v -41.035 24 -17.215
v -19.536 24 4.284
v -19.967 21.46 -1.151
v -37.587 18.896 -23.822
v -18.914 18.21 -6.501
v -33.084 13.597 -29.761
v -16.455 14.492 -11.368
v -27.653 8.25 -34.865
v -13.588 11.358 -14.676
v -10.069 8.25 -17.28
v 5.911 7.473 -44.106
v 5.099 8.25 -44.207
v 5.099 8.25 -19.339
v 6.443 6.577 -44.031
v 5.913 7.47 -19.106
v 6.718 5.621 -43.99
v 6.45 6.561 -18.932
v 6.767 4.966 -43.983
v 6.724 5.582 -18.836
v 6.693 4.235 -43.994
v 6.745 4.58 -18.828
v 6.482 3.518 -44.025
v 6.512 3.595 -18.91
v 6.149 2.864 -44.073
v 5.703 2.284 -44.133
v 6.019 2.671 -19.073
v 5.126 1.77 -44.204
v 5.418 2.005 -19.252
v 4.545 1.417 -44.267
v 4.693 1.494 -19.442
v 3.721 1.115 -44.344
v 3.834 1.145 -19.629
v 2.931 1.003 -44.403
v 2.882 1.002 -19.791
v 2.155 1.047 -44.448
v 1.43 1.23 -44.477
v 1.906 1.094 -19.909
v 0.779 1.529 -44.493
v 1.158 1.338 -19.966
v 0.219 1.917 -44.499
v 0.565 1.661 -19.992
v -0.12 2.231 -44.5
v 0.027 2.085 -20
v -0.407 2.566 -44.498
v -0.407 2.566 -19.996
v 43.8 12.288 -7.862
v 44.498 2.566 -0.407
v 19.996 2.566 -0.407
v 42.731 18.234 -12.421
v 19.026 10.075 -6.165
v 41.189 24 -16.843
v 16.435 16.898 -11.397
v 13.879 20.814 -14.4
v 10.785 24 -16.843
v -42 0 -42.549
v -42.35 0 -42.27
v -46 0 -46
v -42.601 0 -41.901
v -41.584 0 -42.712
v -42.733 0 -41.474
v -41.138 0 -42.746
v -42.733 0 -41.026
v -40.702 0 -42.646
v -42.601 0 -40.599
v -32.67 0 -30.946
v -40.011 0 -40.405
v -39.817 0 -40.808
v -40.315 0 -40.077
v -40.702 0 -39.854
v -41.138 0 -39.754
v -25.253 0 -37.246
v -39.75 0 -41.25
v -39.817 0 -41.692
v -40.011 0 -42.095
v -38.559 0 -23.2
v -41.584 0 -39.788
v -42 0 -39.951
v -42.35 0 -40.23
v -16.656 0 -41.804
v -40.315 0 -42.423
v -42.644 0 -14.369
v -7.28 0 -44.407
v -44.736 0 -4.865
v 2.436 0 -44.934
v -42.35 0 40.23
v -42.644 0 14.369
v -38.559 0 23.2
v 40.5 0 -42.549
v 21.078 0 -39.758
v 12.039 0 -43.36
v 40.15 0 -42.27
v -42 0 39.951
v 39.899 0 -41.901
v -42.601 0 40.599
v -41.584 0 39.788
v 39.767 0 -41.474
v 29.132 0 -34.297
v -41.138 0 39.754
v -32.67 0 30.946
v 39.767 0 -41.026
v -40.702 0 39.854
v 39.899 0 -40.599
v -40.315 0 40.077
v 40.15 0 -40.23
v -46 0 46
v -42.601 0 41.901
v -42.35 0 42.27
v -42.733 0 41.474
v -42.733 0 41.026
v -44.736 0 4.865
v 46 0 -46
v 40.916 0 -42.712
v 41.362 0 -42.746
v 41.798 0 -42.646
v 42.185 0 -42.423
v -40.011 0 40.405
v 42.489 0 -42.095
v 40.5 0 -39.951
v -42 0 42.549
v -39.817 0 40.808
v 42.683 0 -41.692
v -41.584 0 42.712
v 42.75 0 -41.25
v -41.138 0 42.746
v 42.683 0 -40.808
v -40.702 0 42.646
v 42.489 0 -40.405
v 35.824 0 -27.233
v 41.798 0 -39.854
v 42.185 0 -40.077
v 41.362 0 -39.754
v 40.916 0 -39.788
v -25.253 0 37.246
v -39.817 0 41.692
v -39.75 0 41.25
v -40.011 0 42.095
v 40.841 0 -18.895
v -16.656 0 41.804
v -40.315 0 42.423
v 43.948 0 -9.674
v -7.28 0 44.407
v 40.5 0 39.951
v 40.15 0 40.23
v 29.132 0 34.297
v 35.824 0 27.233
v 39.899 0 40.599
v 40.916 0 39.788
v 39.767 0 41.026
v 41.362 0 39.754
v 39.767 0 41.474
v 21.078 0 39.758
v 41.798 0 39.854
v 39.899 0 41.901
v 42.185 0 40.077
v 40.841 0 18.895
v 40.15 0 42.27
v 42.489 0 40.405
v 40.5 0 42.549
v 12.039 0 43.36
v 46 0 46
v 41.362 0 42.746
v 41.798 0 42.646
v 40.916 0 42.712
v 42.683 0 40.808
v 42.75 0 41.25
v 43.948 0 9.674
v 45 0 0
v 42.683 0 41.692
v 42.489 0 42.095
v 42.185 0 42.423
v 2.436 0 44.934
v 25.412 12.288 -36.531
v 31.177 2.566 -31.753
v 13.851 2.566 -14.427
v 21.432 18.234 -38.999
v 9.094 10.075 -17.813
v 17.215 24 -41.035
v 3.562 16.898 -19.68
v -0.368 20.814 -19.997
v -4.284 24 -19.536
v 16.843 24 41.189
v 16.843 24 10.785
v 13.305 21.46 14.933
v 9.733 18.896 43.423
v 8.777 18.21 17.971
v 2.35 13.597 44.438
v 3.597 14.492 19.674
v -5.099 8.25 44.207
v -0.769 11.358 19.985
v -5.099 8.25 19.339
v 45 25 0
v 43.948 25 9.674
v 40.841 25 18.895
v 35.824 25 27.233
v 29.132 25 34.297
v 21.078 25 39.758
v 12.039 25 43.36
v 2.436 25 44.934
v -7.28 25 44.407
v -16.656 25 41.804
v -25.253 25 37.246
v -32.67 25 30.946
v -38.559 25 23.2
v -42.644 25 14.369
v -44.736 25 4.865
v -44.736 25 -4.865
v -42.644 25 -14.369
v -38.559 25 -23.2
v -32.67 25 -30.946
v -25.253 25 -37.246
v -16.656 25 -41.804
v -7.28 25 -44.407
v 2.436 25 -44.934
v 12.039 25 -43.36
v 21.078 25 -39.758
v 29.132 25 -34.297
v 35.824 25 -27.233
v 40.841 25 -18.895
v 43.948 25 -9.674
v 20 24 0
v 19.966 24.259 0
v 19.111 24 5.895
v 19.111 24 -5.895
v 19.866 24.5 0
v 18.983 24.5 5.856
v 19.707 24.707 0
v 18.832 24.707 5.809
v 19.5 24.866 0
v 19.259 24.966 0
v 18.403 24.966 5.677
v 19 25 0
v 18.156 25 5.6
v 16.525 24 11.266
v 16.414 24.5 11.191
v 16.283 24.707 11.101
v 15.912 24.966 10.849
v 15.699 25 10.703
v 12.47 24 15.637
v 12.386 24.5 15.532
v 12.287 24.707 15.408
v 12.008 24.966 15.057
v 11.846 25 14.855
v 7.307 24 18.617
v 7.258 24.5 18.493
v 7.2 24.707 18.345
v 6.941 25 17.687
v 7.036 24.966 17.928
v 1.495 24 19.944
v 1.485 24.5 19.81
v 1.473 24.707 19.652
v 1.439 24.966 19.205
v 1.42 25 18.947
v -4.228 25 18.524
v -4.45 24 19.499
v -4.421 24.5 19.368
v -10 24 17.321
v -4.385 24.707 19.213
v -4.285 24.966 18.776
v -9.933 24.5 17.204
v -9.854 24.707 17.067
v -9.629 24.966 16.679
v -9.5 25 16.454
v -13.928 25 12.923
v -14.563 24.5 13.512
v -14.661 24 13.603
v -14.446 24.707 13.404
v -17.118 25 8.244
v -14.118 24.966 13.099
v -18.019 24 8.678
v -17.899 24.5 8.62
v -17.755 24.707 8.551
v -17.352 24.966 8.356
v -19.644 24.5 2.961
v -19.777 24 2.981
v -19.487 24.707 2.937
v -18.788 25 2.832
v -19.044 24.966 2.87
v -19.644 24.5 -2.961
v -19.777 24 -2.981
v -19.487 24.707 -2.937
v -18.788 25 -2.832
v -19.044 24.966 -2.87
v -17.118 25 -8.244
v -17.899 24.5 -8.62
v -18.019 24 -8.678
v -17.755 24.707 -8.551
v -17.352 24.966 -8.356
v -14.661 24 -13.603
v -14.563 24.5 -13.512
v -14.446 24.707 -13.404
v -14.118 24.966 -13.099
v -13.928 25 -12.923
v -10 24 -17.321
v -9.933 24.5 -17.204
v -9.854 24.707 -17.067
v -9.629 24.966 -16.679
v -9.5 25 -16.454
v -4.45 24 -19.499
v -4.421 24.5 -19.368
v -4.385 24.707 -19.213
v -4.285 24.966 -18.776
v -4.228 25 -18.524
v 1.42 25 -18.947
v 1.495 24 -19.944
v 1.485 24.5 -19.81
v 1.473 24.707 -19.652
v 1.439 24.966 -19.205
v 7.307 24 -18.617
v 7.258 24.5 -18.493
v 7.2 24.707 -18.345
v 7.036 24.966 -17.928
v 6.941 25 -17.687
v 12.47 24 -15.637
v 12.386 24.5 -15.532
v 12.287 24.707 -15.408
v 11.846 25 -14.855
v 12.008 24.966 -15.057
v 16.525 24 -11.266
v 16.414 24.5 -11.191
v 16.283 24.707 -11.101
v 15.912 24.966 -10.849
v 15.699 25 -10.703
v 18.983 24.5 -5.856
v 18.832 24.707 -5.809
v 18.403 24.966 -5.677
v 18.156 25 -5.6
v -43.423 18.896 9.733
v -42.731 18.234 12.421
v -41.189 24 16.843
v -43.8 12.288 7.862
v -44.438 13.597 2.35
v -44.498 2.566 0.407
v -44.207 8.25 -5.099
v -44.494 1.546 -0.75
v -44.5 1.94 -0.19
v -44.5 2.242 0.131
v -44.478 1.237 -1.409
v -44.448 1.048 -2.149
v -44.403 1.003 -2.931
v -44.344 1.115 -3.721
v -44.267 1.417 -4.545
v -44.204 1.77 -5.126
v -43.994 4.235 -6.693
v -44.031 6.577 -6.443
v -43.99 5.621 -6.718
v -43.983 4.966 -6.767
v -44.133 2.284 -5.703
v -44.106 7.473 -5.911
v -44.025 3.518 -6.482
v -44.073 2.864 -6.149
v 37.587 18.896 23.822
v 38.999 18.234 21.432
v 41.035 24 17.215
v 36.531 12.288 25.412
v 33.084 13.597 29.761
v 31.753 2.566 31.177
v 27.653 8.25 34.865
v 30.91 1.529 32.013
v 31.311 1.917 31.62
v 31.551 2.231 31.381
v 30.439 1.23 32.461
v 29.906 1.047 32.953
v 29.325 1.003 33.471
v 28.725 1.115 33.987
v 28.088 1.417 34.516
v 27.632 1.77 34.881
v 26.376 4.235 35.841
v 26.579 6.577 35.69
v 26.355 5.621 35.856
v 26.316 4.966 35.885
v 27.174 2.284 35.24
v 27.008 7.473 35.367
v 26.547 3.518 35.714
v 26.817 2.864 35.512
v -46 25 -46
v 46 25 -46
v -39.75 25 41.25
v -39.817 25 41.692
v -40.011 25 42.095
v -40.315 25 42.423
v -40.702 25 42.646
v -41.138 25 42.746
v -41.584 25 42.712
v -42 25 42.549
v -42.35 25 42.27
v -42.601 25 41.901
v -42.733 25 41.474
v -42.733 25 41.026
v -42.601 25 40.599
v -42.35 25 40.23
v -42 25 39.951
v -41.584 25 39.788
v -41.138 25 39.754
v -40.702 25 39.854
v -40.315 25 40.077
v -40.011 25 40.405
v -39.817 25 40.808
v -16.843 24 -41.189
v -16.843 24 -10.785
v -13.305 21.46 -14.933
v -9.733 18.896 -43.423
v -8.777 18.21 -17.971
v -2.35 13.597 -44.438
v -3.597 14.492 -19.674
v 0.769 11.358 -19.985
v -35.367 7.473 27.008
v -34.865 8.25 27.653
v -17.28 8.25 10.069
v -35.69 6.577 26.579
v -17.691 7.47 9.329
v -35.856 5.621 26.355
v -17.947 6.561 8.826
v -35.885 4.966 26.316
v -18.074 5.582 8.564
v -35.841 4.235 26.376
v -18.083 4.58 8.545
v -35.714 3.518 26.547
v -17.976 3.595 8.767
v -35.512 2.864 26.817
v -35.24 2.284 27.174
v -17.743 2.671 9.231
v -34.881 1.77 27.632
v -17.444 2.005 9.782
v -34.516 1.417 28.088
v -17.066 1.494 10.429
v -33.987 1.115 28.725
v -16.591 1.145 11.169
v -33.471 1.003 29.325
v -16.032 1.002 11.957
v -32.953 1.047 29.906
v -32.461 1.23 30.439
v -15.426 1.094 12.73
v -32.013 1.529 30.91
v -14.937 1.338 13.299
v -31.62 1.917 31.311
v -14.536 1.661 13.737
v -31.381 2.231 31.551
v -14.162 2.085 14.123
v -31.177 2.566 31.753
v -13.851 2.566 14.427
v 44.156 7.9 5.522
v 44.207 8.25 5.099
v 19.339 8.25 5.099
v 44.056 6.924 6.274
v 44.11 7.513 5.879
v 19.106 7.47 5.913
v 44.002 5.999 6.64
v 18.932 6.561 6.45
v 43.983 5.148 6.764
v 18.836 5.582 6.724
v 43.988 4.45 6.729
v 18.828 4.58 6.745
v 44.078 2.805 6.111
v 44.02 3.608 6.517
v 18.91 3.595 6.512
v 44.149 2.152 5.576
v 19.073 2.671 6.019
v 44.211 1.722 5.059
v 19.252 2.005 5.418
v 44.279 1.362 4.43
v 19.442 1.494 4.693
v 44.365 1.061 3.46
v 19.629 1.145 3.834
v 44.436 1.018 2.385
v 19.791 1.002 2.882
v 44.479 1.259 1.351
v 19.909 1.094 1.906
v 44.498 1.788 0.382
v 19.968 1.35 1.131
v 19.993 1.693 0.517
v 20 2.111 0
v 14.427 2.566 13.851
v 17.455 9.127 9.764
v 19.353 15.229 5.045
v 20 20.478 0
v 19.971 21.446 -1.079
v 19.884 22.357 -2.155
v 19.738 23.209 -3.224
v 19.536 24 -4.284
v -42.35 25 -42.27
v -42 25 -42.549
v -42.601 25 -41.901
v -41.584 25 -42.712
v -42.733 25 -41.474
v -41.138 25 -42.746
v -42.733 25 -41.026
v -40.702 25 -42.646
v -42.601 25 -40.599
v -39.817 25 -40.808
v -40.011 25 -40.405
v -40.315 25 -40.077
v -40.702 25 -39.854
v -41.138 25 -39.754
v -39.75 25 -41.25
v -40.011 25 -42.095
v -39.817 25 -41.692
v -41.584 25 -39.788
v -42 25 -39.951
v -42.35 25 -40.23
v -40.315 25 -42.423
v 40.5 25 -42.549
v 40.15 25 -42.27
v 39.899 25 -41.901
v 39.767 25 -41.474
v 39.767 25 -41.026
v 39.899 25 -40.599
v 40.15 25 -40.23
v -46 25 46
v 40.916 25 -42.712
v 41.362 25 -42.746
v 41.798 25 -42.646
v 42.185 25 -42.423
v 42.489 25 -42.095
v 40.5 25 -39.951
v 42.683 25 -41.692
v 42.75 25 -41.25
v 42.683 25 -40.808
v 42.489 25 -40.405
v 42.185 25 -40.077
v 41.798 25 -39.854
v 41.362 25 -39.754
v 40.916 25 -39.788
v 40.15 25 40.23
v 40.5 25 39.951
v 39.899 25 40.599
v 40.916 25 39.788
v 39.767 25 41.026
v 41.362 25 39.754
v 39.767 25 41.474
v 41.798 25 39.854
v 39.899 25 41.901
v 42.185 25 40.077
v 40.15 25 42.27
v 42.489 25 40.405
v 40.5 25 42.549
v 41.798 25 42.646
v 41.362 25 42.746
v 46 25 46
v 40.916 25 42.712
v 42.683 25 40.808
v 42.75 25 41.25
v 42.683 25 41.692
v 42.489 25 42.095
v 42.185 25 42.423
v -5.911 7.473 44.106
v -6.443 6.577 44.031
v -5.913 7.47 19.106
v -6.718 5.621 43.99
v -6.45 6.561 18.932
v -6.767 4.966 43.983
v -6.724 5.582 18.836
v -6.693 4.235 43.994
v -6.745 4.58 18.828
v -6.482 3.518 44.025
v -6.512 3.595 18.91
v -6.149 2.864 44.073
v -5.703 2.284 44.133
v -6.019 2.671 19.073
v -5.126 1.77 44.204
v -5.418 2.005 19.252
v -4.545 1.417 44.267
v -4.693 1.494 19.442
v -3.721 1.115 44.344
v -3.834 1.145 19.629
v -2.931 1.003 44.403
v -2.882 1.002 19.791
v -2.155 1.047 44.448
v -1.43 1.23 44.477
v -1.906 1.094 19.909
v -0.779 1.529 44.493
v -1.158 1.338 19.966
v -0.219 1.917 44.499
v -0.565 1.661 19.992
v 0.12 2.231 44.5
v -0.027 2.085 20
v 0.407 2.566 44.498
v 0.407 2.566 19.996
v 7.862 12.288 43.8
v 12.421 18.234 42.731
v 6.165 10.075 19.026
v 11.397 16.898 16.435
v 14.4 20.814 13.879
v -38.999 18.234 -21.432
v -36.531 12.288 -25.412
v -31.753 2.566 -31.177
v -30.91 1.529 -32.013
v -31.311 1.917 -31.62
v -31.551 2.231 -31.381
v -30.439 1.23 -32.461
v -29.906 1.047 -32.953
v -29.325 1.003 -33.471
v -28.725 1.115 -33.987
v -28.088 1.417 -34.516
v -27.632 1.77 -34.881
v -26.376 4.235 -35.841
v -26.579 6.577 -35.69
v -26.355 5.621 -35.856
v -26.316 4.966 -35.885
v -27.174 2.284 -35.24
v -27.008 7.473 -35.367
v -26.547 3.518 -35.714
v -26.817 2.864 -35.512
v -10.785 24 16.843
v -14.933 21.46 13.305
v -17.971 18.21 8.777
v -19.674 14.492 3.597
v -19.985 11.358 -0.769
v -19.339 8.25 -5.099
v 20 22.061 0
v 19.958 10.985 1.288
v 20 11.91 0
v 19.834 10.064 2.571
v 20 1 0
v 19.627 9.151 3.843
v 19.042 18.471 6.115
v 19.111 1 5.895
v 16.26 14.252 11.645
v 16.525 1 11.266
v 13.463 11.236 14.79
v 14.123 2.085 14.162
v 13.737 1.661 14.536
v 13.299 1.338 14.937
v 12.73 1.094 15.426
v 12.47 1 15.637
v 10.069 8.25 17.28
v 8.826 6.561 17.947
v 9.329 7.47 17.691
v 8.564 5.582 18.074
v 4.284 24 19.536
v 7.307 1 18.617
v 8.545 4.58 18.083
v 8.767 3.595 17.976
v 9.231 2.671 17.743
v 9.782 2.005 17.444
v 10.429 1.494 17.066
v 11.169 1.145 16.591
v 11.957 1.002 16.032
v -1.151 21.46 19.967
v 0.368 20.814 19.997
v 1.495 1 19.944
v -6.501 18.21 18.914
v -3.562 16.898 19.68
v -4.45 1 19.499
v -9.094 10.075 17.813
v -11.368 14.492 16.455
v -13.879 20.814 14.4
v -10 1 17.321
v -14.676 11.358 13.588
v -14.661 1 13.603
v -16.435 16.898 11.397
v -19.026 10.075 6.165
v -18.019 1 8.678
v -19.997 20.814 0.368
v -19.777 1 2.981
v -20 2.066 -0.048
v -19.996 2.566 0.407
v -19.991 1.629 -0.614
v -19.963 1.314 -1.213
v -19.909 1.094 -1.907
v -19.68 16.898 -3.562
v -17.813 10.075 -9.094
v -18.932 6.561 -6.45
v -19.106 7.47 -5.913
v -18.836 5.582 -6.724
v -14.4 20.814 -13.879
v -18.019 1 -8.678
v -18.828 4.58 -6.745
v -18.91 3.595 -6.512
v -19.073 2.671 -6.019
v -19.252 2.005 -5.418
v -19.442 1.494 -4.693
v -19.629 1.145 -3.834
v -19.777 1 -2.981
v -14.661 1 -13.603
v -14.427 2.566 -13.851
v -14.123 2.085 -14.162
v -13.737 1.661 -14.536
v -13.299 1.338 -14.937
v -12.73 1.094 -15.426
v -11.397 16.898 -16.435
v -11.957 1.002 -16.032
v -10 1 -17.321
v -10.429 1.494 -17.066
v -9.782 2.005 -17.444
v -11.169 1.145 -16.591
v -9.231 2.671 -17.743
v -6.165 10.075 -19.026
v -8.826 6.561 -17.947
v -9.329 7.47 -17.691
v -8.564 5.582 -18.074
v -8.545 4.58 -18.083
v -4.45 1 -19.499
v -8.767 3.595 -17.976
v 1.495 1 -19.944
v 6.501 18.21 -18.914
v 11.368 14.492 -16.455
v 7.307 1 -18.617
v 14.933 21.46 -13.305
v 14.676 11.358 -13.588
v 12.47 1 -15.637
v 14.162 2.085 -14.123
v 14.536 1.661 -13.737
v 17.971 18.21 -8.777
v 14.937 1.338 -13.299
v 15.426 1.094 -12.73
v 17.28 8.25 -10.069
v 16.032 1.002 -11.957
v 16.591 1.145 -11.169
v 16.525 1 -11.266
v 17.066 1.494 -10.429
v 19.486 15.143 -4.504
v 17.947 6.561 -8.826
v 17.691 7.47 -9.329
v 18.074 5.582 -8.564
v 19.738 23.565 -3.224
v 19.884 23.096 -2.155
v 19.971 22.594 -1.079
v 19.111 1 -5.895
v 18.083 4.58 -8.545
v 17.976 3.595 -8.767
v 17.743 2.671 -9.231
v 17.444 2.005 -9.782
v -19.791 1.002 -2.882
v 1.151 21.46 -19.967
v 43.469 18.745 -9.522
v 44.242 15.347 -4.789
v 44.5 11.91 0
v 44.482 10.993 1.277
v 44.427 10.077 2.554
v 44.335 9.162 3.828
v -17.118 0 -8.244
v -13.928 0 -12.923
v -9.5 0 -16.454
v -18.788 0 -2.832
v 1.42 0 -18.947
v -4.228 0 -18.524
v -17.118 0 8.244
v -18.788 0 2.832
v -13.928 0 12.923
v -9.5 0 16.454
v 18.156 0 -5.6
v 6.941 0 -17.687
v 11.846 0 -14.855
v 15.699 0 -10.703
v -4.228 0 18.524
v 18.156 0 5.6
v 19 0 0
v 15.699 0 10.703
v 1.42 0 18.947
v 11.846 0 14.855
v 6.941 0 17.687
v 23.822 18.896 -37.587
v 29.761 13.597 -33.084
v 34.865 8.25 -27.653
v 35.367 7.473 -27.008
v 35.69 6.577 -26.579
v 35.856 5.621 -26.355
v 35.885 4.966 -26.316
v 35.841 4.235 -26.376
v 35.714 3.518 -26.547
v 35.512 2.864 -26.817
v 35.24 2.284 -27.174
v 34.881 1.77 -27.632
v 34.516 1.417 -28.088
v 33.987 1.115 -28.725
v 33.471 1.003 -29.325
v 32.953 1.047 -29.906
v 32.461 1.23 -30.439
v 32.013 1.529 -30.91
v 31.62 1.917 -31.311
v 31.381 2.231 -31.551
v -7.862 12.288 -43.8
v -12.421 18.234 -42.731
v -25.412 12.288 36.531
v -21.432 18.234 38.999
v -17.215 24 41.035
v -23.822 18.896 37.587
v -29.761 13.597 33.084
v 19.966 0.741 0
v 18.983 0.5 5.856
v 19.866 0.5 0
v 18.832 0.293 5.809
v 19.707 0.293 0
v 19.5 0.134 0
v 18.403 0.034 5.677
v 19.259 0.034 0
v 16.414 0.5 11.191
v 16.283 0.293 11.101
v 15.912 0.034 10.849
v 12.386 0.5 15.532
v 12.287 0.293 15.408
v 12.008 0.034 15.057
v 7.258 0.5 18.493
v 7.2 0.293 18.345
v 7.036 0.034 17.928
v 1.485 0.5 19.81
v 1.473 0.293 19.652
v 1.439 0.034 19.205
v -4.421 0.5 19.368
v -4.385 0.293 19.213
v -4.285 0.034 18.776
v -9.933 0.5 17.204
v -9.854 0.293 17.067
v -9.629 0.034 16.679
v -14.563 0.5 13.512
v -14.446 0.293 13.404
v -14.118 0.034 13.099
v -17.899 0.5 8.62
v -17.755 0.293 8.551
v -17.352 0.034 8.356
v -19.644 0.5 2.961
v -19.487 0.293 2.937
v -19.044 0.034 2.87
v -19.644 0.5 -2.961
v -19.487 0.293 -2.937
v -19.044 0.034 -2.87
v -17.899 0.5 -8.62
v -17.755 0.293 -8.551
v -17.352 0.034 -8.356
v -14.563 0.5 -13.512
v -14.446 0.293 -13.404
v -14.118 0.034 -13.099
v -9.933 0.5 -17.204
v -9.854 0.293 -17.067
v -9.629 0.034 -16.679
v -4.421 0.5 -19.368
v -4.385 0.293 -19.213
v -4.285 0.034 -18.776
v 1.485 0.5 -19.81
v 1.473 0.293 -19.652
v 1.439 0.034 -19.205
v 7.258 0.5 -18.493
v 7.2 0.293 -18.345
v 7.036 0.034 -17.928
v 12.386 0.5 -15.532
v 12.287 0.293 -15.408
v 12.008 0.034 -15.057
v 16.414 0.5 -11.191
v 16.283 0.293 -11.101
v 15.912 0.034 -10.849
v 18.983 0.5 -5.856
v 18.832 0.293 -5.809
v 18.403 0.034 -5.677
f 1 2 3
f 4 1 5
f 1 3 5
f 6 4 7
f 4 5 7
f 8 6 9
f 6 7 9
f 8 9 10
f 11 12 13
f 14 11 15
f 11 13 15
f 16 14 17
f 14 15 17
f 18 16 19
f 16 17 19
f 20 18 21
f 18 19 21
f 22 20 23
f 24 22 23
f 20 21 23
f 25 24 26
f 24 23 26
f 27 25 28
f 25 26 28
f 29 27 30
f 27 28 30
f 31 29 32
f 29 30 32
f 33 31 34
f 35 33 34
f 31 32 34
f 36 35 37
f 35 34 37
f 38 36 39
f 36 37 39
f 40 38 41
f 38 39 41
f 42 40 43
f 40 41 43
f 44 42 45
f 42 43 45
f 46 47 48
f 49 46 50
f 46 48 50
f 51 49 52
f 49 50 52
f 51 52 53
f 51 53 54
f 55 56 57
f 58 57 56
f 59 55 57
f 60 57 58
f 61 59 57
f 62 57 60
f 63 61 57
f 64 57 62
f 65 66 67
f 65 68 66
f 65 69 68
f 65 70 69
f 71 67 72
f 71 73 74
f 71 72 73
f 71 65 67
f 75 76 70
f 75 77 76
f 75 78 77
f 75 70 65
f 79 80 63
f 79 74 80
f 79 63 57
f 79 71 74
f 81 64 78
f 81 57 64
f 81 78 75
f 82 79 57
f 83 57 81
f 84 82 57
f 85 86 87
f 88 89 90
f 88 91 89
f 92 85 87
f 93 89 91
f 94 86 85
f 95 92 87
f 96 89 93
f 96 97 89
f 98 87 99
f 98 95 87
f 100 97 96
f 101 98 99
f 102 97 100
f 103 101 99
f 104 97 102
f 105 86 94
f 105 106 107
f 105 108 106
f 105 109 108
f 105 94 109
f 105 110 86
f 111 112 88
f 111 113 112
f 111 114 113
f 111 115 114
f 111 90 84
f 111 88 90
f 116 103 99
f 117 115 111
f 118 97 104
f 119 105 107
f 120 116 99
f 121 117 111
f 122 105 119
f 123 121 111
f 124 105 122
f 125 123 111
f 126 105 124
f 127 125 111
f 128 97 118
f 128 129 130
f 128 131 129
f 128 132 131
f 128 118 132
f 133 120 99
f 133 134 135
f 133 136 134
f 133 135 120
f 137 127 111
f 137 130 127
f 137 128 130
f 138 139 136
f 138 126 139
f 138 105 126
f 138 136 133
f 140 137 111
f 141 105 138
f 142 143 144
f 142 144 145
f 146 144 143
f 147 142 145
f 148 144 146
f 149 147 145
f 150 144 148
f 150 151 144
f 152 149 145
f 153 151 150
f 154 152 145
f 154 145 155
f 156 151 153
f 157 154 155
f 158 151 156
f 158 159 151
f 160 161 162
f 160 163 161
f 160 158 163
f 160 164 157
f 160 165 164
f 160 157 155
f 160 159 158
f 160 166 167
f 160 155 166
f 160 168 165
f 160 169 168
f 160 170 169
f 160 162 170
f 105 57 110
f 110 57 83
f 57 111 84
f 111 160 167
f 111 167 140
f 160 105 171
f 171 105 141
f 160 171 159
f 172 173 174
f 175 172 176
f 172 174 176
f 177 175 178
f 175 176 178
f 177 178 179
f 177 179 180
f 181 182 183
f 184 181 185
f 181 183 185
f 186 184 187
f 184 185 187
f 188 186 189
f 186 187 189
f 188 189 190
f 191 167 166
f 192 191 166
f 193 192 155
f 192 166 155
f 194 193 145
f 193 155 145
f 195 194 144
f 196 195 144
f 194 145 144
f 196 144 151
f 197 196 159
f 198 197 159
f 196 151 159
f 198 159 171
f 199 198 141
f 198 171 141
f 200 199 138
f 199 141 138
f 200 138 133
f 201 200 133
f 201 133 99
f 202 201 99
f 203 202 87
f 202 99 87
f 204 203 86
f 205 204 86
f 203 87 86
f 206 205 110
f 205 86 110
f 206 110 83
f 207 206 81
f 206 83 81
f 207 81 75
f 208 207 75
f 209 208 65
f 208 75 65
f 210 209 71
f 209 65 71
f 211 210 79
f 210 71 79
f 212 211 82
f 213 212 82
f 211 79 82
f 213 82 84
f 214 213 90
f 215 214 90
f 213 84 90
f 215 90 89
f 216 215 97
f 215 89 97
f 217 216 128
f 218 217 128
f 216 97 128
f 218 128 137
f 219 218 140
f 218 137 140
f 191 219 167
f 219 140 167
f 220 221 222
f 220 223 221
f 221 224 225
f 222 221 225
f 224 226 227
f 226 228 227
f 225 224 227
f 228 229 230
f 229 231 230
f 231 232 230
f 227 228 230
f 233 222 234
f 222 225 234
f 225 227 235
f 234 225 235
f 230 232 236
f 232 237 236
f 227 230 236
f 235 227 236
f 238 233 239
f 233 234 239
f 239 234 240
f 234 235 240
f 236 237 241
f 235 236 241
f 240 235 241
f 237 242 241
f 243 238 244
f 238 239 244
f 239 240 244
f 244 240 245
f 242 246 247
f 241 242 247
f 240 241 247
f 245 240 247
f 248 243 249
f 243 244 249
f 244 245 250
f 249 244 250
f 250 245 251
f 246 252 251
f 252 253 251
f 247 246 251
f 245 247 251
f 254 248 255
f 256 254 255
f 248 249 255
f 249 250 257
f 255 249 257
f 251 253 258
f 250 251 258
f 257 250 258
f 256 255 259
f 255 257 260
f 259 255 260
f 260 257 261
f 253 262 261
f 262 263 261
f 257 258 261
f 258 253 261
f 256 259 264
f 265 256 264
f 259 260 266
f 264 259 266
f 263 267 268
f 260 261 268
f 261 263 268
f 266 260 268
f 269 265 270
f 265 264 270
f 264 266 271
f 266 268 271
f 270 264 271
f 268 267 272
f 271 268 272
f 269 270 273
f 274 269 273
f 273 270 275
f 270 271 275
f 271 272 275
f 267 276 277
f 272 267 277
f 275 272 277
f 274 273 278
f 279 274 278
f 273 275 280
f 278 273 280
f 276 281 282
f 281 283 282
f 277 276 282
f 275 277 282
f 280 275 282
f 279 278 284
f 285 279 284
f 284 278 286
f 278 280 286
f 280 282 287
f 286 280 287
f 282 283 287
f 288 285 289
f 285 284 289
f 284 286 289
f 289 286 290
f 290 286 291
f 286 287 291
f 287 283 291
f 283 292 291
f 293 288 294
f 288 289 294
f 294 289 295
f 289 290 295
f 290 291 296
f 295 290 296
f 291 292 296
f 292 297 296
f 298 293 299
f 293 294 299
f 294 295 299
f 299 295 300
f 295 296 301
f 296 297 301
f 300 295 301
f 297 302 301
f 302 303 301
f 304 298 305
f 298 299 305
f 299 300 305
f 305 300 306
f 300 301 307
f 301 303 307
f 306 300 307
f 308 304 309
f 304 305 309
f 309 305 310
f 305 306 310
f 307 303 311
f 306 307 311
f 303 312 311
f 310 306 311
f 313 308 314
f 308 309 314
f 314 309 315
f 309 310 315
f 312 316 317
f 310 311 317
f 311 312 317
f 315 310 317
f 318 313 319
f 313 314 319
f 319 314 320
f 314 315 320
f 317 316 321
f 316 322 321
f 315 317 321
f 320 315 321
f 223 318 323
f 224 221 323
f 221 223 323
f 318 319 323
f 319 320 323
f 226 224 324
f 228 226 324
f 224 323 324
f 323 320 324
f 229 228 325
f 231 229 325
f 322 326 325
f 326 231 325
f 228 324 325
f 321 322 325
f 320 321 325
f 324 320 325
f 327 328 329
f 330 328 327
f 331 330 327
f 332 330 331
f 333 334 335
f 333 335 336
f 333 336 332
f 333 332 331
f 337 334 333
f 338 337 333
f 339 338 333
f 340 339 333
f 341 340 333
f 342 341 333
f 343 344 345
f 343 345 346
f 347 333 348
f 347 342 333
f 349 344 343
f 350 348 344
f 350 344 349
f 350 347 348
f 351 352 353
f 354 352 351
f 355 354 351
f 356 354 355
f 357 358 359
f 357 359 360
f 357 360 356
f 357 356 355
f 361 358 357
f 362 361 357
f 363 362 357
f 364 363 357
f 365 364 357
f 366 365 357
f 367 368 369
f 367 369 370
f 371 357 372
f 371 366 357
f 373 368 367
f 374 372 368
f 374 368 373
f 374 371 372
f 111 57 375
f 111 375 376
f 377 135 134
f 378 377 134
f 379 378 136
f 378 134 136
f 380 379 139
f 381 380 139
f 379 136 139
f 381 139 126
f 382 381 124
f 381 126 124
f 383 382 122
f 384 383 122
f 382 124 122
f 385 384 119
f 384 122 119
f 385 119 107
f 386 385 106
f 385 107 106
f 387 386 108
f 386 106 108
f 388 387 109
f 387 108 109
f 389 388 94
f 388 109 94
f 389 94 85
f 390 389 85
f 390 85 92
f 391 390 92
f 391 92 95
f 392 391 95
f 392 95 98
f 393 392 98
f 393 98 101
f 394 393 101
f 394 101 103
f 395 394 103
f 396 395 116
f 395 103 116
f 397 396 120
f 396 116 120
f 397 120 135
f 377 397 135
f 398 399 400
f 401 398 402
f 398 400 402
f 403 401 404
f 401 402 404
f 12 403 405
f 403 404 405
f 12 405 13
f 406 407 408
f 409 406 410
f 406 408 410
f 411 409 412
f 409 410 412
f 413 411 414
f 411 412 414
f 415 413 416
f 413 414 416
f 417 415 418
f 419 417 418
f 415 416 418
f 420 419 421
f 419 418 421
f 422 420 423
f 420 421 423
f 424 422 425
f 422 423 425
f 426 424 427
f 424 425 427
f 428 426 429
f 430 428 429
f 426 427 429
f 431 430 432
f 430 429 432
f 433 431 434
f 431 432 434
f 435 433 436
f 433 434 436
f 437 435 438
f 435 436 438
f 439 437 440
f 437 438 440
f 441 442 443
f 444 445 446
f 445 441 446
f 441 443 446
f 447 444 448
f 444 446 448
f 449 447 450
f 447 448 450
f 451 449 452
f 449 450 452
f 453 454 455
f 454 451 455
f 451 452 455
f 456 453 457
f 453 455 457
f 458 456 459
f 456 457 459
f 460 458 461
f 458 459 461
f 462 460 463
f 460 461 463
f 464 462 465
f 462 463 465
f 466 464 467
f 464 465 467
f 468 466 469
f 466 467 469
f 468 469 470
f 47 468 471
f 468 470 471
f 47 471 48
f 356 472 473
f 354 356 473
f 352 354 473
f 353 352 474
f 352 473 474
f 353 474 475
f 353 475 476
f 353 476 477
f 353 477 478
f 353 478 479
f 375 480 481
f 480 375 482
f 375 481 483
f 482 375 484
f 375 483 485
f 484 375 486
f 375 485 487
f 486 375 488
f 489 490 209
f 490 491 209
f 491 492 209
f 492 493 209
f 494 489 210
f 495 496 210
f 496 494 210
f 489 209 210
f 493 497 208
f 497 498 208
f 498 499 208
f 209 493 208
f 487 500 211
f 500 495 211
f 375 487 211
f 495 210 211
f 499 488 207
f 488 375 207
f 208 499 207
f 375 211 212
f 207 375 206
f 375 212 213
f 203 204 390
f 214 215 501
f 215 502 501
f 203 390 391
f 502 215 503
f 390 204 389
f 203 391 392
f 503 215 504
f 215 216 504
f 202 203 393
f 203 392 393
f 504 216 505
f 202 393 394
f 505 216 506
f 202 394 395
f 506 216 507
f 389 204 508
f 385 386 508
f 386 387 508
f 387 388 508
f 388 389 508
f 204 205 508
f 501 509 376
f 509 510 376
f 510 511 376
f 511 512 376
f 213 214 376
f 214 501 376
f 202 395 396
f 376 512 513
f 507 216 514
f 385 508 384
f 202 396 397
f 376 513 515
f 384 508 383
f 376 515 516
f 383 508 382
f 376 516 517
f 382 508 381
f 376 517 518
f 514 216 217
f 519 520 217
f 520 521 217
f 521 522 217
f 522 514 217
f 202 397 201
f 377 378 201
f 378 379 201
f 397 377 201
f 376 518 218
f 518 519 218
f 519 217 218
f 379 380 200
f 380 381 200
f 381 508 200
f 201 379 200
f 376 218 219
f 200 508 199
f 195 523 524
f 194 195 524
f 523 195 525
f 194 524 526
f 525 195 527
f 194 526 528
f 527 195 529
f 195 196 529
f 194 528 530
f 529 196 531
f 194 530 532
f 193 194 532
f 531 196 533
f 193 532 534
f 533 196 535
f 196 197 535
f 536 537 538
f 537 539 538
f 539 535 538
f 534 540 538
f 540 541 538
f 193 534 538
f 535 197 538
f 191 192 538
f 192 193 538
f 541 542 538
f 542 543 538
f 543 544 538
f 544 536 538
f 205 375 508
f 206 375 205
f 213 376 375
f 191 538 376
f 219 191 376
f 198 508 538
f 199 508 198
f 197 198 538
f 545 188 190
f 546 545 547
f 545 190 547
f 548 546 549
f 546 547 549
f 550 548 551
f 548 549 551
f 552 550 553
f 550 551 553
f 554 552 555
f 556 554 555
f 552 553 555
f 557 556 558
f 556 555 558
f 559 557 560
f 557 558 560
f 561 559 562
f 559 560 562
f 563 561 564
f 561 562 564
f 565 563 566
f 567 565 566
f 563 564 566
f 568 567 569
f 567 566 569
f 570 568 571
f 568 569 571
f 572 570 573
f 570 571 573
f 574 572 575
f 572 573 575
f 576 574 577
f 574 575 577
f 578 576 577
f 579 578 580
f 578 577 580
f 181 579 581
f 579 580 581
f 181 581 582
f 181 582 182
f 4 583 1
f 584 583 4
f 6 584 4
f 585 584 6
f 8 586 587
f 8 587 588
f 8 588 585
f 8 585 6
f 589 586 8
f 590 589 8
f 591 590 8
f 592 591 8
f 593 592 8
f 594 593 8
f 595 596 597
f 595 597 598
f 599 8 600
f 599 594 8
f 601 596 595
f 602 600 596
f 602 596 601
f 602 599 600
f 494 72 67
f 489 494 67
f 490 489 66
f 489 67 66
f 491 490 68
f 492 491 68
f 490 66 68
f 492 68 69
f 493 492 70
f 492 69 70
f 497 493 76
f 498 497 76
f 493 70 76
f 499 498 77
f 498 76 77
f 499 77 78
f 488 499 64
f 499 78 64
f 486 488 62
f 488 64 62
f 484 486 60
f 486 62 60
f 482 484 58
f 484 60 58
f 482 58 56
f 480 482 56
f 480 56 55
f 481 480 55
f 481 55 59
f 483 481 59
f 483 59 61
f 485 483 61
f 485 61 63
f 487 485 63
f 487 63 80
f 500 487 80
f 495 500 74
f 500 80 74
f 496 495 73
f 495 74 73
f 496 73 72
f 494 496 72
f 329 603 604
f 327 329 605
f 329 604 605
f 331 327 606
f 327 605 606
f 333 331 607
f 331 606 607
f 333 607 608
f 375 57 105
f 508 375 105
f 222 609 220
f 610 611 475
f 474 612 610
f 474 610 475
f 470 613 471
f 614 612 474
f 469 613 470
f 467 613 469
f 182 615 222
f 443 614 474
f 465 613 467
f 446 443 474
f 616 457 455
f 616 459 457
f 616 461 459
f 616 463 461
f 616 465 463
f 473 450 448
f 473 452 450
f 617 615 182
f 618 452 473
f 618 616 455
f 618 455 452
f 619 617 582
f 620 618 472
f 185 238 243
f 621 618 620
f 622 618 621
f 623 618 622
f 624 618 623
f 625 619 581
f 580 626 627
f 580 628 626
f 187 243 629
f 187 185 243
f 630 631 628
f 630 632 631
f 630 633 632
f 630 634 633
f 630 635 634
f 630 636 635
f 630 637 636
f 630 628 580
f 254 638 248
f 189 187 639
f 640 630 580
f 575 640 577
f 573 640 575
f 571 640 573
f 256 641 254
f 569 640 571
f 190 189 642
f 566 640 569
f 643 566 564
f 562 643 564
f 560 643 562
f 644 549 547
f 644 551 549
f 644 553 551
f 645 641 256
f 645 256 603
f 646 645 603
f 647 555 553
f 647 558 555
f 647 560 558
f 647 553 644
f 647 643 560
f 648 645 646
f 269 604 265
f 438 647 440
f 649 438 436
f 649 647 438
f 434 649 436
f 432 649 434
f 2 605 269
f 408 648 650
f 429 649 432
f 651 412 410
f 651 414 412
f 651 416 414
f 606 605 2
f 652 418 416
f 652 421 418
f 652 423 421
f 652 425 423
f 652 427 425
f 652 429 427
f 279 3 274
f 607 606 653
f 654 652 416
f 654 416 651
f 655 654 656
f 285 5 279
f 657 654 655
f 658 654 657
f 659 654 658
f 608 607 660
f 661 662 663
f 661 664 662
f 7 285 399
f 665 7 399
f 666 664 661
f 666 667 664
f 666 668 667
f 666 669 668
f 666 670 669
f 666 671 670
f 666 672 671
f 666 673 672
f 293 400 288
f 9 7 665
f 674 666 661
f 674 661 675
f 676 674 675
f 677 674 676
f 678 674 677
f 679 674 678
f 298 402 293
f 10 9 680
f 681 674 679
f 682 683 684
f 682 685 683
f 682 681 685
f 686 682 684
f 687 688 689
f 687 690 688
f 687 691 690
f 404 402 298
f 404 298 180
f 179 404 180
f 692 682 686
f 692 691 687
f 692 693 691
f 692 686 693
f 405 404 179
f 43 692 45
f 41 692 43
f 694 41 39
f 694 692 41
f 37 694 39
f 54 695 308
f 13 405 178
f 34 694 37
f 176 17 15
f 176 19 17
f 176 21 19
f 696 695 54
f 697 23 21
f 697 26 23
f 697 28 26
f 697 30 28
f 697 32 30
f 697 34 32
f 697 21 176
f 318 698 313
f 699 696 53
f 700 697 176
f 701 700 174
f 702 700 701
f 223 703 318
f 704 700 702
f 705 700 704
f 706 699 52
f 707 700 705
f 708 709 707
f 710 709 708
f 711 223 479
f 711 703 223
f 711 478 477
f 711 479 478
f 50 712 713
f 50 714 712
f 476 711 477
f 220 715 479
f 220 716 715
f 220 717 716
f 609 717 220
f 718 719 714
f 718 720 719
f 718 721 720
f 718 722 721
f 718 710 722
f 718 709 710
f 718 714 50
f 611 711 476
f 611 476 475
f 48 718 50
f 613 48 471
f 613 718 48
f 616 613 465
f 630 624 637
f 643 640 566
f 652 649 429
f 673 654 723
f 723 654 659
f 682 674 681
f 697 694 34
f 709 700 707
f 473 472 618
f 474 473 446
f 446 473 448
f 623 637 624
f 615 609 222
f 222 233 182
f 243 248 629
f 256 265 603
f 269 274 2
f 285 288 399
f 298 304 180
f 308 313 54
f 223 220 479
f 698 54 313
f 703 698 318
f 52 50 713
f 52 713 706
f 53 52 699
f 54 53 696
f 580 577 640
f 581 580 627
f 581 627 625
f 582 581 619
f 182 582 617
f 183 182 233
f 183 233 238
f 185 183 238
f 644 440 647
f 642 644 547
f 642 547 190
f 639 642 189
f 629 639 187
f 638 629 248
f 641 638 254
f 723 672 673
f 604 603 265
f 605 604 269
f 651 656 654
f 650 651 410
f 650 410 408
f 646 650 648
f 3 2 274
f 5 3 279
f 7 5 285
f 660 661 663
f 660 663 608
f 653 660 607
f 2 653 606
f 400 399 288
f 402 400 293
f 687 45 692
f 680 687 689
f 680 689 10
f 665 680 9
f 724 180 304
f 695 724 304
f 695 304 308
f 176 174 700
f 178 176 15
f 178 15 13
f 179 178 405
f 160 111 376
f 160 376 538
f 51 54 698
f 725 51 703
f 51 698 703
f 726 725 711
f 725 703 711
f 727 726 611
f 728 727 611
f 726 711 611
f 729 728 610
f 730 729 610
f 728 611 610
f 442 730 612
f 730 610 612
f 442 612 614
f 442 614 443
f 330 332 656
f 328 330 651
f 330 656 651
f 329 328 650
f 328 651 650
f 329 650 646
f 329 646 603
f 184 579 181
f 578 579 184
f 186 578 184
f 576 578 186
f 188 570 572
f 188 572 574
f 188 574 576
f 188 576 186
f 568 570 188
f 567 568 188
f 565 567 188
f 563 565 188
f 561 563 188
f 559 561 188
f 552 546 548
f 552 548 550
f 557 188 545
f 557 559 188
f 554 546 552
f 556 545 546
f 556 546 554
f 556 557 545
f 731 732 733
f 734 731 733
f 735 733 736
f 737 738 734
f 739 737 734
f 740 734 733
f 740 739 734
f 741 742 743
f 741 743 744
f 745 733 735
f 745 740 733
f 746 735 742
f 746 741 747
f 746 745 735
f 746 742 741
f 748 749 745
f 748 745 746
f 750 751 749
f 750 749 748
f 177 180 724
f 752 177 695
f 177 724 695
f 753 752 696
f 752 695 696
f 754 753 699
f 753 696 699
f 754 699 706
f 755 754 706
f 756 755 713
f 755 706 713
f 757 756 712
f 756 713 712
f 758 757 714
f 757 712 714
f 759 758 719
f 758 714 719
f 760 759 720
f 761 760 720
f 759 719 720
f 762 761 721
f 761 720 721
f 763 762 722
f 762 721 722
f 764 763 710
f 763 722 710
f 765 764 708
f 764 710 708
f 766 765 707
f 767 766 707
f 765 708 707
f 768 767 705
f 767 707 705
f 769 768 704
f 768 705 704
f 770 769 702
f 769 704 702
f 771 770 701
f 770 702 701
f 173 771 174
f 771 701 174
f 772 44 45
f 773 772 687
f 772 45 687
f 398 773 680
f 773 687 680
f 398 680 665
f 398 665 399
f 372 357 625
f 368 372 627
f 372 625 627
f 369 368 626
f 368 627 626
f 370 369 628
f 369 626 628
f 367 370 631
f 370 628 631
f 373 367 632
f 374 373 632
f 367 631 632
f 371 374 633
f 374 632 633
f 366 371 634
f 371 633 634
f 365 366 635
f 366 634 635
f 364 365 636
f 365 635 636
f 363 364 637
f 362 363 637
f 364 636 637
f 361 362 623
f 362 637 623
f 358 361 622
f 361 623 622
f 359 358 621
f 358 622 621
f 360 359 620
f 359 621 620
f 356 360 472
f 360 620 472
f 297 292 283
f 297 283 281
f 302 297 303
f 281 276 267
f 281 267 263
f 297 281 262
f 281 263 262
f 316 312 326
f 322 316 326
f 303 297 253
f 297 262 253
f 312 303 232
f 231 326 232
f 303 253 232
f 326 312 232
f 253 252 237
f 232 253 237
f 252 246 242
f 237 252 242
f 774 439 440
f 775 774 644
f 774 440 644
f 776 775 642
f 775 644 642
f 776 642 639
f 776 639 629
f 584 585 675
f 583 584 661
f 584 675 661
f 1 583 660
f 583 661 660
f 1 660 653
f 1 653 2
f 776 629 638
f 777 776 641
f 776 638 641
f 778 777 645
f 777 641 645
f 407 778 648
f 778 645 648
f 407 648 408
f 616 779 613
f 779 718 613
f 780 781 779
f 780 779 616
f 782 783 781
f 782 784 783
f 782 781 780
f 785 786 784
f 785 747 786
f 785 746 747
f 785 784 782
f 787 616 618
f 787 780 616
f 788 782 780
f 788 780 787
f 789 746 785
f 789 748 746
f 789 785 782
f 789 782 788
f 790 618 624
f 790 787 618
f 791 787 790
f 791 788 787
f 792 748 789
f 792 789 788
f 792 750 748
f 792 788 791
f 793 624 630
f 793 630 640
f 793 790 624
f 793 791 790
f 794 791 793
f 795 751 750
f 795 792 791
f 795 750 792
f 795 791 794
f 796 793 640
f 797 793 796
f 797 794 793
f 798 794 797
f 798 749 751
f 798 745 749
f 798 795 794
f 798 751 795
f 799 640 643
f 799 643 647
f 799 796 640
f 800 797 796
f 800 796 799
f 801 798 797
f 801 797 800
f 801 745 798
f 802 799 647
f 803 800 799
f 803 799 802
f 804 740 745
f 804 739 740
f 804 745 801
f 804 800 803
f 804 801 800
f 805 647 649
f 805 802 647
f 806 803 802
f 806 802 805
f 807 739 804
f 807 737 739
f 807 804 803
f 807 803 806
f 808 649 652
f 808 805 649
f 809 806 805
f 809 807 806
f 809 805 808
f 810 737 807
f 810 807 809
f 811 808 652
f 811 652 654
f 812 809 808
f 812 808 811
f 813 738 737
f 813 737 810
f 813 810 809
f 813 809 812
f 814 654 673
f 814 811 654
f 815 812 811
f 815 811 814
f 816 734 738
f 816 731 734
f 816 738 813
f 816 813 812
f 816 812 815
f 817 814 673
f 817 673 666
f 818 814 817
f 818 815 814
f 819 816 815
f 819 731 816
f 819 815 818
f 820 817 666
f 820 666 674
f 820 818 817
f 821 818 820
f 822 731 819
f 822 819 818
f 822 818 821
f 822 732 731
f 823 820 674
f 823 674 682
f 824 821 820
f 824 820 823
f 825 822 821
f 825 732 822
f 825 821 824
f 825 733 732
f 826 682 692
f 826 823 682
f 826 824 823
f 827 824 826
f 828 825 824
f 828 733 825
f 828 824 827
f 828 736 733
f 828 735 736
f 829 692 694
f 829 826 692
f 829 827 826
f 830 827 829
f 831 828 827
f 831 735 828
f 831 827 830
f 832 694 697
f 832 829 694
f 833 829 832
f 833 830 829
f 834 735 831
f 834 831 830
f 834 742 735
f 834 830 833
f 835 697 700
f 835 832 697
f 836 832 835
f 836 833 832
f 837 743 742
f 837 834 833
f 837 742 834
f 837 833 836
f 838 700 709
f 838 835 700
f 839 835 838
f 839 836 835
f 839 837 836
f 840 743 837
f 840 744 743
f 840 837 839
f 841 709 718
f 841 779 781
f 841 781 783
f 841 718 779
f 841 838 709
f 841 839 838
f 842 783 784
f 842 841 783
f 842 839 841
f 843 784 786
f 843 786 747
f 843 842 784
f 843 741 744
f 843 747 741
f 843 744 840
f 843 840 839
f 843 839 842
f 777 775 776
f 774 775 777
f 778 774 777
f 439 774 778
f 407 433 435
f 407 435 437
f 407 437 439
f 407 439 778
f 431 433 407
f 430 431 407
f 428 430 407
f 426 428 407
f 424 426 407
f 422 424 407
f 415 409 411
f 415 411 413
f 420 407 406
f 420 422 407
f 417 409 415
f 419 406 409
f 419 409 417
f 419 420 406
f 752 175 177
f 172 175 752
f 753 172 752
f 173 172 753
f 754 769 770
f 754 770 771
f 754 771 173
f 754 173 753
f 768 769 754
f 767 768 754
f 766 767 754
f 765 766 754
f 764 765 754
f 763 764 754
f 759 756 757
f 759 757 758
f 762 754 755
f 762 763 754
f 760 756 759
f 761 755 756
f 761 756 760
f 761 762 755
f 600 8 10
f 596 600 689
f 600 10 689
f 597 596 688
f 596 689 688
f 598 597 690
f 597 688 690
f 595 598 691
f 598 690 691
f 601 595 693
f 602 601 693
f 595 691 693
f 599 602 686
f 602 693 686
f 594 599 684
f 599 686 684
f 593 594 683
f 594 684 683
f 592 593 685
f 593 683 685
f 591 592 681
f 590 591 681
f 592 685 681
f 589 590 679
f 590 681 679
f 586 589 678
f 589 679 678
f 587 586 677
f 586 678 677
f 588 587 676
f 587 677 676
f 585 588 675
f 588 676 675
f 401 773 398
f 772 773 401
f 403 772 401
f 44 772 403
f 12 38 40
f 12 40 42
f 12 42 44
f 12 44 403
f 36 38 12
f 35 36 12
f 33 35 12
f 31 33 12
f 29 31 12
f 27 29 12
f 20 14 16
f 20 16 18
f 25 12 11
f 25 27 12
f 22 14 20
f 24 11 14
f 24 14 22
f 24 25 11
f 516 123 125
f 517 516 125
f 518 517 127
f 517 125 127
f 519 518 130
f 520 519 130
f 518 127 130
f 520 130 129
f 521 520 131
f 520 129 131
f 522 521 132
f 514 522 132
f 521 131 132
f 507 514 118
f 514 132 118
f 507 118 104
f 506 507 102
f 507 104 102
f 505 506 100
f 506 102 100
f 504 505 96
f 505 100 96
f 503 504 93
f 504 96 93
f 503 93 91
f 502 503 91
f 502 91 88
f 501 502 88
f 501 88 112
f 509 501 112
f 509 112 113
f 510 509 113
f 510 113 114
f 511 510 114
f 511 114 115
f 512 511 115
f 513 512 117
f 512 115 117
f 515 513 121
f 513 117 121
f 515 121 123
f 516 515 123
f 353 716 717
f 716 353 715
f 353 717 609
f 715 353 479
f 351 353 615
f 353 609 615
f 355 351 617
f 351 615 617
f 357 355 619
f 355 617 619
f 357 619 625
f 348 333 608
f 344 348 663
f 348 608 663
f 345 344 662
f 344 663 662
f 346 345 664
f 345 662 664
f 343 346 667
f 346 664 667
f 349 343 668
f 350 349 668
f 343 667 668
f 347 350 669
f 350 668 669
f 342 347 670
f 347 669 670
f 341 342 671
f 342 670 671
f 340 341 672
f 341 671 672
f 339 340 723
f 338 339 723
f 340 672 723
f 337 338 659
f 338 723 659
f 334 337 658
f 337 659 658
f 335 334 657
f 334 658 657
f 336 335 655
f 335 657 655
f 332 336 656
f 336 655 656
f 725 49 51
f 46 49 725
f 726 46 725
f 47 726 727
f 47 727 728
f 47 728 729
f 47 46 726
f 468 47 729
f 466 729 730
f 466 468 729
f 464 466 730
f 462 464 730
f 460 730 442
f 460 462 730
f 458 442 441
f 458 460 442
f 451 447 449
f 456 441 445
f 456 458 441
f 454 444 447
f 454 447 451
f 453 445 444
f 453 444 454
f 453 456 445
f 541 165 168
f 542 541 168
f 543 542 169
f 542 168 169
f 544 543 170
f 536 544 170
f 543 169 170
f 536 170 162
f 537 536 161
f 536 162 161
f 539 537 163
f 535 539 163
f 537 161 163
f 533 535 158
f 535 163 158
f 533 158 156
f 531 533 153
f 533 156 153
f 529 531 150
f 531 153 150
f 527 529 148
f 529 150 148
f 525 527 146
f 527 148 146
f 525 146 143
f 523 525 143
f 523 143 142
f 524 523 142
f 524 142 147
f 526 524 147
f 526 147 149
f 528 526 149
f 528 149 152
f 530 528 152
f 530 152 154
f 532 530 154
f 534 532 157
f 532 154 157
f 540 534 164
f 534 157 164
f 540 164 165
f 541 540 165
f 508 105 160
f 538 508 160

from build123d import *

# Parameters (mm, degrees)
F0_W     = 92
F0_H     = 92
F0_R     = 1.5
F0_R_2   = 45
F1_DEPTH = 25
F3_DEPTH = 50
F4_COUNT = 8
F5_R     = 20
F6_DEPTH = 25
F7_W     = 120
F7_H     = 120
F7_R     = 44.5
F8_DEPTH = 25.0010001
F9_R     = 0.99999


# Not quite as in the source:
# - a fillet or chamfer is up to 0.001 mm smaller than in the source, because OpenCascade refuses the exact size


with BuildPart() as f1:
    # F0 (on Front) → F1 (new body)
    with BuildSketch(Plane.XZ):
        Rectangle(F0_W, F0_H)
        with Locations((-41.25, -41.25)):
            Circle(F0_R, mode=Mode.SUBTRACT)
        with Locations((41.25, -41.25)):
            Circle(F0_R, mode=Mode.SUBTRACT)
        with Locations((-41.25, 41.25)):
            Circle(F0_R, mode=Mode.SUBTRACT)
        Circle(F0_R_2, mode=Mode.SUBTRACT)
        with Locations((41.25, 41.25)):
            Circle(F0_R, mode=Mode.SUBTRACT)
    extrude(amount=-F1_DEPTH)


with BuildPart() as f3:
    # F2 (on Right) → F3 (new body)
    with BuildSketch(Plane.YZ):
        with BuildLine():
            ThreePointArc((8.2495088034, 5.0992883494), (2.2165993594, 5.6395071005), (2.5659984731, -0.4074551879))
            Line((2.5659984731, -0.4074551879), (24, -16.8431419879))
            Line((24, -16.8431419879), (8.2495088034, 5.0992883494))
        make_face()
    extrude(amount=F3_DEPTH)


with BuildPart() as f4_1:
    # F4: instance of F3
    add(f3.part.rotate(Axis((0, -8.8478960097, 0), (0, -1, 0)), 1 * 360 / F4_COUNT))


with BuildPart() as f4_2:
    # F4: instance of F3
    add(f3.part.rotate(Axis((0, -8.8478960097, 0), (0, -1, 0)), 2 * 360 / F4_COUNT))


with BuildPart() as f4_3:
    # F4: instance of F3
    add(f3.part.rotate(Axis((0, -8.8478960097, 0), (0, -1, 0)), 3 * 360 / F4_COUNT))


with BuildPart() as f4_4:
    # F4: instance of F3
    add(f3.part.rotate(Axis((0, -8.8478960097, 0), (0, -1, 0)), 4 * 360 / F4_COUNT))


with BuildPart() as f4_5:
    # F4: instance of F3
    add(f3.part.rotate(Axis((0, -8.8478960097, 0), (0, -1, 0)), 5 * 360 / F4_COUNT))


with BuildPart() as f4_6:
    # F4: instance of F3
    add(f3.part.rotate(Axis((0, -8.8478960097, 0), (0, -1, 0)), 6 * 360 / F4_COUNT))


with BuildPart() as f4_7:
    # F4: instance of F3
    add(f3.part.rotate(Axis((0, -8.8478960097, 0), (0, -1, 0)), 7 * 360 / F4_COUNT))


with BuildPart() as f3_1:
    add(f3.part)

    add(f4_1.part)  # F6 merges F4_1

    add(f4_2.part)  # F6 merges F4_2

    add(f4_3.part)  # F6 merges F4_3

    add(f4_4.part)  # F6 merges F4_4

    add(f4_5.part)  # F6 merges F4_5

    add(f4_6.part)  # F6 merges F4_6

    add(f4_7.part)  # F6 merges F4_7
    # F5 (on Front) → F6 (join)
    with BuildSketch(Plane.XZ):
        Circle(F5_R)
    extrude(amount=-F6_DEPTH)

    # F7 (on Front) → F8 (cut, through all)
    with BuildSketch(Plane.XZ):
        Rectangle(F7_W, F7_H)
        Circle(F7_R, mode=Mode.SUBTRACT)
    extrude(amount=-F8_DEPTH, mode=Mode.SUBTRACT)

    # F9 (radius 1 in the source; OpenCascade refuses exactly that, so slightly less here)
    f9_edges = [f3_1.edges().sort_by_distance(p)[0] for p in [
        (-20, 0, 0),
        (-20, 25, 0),
    ]]
    fillet(f9_edges, radius=F9_R)


solid = Compound([f1.part, f3_1.part])
